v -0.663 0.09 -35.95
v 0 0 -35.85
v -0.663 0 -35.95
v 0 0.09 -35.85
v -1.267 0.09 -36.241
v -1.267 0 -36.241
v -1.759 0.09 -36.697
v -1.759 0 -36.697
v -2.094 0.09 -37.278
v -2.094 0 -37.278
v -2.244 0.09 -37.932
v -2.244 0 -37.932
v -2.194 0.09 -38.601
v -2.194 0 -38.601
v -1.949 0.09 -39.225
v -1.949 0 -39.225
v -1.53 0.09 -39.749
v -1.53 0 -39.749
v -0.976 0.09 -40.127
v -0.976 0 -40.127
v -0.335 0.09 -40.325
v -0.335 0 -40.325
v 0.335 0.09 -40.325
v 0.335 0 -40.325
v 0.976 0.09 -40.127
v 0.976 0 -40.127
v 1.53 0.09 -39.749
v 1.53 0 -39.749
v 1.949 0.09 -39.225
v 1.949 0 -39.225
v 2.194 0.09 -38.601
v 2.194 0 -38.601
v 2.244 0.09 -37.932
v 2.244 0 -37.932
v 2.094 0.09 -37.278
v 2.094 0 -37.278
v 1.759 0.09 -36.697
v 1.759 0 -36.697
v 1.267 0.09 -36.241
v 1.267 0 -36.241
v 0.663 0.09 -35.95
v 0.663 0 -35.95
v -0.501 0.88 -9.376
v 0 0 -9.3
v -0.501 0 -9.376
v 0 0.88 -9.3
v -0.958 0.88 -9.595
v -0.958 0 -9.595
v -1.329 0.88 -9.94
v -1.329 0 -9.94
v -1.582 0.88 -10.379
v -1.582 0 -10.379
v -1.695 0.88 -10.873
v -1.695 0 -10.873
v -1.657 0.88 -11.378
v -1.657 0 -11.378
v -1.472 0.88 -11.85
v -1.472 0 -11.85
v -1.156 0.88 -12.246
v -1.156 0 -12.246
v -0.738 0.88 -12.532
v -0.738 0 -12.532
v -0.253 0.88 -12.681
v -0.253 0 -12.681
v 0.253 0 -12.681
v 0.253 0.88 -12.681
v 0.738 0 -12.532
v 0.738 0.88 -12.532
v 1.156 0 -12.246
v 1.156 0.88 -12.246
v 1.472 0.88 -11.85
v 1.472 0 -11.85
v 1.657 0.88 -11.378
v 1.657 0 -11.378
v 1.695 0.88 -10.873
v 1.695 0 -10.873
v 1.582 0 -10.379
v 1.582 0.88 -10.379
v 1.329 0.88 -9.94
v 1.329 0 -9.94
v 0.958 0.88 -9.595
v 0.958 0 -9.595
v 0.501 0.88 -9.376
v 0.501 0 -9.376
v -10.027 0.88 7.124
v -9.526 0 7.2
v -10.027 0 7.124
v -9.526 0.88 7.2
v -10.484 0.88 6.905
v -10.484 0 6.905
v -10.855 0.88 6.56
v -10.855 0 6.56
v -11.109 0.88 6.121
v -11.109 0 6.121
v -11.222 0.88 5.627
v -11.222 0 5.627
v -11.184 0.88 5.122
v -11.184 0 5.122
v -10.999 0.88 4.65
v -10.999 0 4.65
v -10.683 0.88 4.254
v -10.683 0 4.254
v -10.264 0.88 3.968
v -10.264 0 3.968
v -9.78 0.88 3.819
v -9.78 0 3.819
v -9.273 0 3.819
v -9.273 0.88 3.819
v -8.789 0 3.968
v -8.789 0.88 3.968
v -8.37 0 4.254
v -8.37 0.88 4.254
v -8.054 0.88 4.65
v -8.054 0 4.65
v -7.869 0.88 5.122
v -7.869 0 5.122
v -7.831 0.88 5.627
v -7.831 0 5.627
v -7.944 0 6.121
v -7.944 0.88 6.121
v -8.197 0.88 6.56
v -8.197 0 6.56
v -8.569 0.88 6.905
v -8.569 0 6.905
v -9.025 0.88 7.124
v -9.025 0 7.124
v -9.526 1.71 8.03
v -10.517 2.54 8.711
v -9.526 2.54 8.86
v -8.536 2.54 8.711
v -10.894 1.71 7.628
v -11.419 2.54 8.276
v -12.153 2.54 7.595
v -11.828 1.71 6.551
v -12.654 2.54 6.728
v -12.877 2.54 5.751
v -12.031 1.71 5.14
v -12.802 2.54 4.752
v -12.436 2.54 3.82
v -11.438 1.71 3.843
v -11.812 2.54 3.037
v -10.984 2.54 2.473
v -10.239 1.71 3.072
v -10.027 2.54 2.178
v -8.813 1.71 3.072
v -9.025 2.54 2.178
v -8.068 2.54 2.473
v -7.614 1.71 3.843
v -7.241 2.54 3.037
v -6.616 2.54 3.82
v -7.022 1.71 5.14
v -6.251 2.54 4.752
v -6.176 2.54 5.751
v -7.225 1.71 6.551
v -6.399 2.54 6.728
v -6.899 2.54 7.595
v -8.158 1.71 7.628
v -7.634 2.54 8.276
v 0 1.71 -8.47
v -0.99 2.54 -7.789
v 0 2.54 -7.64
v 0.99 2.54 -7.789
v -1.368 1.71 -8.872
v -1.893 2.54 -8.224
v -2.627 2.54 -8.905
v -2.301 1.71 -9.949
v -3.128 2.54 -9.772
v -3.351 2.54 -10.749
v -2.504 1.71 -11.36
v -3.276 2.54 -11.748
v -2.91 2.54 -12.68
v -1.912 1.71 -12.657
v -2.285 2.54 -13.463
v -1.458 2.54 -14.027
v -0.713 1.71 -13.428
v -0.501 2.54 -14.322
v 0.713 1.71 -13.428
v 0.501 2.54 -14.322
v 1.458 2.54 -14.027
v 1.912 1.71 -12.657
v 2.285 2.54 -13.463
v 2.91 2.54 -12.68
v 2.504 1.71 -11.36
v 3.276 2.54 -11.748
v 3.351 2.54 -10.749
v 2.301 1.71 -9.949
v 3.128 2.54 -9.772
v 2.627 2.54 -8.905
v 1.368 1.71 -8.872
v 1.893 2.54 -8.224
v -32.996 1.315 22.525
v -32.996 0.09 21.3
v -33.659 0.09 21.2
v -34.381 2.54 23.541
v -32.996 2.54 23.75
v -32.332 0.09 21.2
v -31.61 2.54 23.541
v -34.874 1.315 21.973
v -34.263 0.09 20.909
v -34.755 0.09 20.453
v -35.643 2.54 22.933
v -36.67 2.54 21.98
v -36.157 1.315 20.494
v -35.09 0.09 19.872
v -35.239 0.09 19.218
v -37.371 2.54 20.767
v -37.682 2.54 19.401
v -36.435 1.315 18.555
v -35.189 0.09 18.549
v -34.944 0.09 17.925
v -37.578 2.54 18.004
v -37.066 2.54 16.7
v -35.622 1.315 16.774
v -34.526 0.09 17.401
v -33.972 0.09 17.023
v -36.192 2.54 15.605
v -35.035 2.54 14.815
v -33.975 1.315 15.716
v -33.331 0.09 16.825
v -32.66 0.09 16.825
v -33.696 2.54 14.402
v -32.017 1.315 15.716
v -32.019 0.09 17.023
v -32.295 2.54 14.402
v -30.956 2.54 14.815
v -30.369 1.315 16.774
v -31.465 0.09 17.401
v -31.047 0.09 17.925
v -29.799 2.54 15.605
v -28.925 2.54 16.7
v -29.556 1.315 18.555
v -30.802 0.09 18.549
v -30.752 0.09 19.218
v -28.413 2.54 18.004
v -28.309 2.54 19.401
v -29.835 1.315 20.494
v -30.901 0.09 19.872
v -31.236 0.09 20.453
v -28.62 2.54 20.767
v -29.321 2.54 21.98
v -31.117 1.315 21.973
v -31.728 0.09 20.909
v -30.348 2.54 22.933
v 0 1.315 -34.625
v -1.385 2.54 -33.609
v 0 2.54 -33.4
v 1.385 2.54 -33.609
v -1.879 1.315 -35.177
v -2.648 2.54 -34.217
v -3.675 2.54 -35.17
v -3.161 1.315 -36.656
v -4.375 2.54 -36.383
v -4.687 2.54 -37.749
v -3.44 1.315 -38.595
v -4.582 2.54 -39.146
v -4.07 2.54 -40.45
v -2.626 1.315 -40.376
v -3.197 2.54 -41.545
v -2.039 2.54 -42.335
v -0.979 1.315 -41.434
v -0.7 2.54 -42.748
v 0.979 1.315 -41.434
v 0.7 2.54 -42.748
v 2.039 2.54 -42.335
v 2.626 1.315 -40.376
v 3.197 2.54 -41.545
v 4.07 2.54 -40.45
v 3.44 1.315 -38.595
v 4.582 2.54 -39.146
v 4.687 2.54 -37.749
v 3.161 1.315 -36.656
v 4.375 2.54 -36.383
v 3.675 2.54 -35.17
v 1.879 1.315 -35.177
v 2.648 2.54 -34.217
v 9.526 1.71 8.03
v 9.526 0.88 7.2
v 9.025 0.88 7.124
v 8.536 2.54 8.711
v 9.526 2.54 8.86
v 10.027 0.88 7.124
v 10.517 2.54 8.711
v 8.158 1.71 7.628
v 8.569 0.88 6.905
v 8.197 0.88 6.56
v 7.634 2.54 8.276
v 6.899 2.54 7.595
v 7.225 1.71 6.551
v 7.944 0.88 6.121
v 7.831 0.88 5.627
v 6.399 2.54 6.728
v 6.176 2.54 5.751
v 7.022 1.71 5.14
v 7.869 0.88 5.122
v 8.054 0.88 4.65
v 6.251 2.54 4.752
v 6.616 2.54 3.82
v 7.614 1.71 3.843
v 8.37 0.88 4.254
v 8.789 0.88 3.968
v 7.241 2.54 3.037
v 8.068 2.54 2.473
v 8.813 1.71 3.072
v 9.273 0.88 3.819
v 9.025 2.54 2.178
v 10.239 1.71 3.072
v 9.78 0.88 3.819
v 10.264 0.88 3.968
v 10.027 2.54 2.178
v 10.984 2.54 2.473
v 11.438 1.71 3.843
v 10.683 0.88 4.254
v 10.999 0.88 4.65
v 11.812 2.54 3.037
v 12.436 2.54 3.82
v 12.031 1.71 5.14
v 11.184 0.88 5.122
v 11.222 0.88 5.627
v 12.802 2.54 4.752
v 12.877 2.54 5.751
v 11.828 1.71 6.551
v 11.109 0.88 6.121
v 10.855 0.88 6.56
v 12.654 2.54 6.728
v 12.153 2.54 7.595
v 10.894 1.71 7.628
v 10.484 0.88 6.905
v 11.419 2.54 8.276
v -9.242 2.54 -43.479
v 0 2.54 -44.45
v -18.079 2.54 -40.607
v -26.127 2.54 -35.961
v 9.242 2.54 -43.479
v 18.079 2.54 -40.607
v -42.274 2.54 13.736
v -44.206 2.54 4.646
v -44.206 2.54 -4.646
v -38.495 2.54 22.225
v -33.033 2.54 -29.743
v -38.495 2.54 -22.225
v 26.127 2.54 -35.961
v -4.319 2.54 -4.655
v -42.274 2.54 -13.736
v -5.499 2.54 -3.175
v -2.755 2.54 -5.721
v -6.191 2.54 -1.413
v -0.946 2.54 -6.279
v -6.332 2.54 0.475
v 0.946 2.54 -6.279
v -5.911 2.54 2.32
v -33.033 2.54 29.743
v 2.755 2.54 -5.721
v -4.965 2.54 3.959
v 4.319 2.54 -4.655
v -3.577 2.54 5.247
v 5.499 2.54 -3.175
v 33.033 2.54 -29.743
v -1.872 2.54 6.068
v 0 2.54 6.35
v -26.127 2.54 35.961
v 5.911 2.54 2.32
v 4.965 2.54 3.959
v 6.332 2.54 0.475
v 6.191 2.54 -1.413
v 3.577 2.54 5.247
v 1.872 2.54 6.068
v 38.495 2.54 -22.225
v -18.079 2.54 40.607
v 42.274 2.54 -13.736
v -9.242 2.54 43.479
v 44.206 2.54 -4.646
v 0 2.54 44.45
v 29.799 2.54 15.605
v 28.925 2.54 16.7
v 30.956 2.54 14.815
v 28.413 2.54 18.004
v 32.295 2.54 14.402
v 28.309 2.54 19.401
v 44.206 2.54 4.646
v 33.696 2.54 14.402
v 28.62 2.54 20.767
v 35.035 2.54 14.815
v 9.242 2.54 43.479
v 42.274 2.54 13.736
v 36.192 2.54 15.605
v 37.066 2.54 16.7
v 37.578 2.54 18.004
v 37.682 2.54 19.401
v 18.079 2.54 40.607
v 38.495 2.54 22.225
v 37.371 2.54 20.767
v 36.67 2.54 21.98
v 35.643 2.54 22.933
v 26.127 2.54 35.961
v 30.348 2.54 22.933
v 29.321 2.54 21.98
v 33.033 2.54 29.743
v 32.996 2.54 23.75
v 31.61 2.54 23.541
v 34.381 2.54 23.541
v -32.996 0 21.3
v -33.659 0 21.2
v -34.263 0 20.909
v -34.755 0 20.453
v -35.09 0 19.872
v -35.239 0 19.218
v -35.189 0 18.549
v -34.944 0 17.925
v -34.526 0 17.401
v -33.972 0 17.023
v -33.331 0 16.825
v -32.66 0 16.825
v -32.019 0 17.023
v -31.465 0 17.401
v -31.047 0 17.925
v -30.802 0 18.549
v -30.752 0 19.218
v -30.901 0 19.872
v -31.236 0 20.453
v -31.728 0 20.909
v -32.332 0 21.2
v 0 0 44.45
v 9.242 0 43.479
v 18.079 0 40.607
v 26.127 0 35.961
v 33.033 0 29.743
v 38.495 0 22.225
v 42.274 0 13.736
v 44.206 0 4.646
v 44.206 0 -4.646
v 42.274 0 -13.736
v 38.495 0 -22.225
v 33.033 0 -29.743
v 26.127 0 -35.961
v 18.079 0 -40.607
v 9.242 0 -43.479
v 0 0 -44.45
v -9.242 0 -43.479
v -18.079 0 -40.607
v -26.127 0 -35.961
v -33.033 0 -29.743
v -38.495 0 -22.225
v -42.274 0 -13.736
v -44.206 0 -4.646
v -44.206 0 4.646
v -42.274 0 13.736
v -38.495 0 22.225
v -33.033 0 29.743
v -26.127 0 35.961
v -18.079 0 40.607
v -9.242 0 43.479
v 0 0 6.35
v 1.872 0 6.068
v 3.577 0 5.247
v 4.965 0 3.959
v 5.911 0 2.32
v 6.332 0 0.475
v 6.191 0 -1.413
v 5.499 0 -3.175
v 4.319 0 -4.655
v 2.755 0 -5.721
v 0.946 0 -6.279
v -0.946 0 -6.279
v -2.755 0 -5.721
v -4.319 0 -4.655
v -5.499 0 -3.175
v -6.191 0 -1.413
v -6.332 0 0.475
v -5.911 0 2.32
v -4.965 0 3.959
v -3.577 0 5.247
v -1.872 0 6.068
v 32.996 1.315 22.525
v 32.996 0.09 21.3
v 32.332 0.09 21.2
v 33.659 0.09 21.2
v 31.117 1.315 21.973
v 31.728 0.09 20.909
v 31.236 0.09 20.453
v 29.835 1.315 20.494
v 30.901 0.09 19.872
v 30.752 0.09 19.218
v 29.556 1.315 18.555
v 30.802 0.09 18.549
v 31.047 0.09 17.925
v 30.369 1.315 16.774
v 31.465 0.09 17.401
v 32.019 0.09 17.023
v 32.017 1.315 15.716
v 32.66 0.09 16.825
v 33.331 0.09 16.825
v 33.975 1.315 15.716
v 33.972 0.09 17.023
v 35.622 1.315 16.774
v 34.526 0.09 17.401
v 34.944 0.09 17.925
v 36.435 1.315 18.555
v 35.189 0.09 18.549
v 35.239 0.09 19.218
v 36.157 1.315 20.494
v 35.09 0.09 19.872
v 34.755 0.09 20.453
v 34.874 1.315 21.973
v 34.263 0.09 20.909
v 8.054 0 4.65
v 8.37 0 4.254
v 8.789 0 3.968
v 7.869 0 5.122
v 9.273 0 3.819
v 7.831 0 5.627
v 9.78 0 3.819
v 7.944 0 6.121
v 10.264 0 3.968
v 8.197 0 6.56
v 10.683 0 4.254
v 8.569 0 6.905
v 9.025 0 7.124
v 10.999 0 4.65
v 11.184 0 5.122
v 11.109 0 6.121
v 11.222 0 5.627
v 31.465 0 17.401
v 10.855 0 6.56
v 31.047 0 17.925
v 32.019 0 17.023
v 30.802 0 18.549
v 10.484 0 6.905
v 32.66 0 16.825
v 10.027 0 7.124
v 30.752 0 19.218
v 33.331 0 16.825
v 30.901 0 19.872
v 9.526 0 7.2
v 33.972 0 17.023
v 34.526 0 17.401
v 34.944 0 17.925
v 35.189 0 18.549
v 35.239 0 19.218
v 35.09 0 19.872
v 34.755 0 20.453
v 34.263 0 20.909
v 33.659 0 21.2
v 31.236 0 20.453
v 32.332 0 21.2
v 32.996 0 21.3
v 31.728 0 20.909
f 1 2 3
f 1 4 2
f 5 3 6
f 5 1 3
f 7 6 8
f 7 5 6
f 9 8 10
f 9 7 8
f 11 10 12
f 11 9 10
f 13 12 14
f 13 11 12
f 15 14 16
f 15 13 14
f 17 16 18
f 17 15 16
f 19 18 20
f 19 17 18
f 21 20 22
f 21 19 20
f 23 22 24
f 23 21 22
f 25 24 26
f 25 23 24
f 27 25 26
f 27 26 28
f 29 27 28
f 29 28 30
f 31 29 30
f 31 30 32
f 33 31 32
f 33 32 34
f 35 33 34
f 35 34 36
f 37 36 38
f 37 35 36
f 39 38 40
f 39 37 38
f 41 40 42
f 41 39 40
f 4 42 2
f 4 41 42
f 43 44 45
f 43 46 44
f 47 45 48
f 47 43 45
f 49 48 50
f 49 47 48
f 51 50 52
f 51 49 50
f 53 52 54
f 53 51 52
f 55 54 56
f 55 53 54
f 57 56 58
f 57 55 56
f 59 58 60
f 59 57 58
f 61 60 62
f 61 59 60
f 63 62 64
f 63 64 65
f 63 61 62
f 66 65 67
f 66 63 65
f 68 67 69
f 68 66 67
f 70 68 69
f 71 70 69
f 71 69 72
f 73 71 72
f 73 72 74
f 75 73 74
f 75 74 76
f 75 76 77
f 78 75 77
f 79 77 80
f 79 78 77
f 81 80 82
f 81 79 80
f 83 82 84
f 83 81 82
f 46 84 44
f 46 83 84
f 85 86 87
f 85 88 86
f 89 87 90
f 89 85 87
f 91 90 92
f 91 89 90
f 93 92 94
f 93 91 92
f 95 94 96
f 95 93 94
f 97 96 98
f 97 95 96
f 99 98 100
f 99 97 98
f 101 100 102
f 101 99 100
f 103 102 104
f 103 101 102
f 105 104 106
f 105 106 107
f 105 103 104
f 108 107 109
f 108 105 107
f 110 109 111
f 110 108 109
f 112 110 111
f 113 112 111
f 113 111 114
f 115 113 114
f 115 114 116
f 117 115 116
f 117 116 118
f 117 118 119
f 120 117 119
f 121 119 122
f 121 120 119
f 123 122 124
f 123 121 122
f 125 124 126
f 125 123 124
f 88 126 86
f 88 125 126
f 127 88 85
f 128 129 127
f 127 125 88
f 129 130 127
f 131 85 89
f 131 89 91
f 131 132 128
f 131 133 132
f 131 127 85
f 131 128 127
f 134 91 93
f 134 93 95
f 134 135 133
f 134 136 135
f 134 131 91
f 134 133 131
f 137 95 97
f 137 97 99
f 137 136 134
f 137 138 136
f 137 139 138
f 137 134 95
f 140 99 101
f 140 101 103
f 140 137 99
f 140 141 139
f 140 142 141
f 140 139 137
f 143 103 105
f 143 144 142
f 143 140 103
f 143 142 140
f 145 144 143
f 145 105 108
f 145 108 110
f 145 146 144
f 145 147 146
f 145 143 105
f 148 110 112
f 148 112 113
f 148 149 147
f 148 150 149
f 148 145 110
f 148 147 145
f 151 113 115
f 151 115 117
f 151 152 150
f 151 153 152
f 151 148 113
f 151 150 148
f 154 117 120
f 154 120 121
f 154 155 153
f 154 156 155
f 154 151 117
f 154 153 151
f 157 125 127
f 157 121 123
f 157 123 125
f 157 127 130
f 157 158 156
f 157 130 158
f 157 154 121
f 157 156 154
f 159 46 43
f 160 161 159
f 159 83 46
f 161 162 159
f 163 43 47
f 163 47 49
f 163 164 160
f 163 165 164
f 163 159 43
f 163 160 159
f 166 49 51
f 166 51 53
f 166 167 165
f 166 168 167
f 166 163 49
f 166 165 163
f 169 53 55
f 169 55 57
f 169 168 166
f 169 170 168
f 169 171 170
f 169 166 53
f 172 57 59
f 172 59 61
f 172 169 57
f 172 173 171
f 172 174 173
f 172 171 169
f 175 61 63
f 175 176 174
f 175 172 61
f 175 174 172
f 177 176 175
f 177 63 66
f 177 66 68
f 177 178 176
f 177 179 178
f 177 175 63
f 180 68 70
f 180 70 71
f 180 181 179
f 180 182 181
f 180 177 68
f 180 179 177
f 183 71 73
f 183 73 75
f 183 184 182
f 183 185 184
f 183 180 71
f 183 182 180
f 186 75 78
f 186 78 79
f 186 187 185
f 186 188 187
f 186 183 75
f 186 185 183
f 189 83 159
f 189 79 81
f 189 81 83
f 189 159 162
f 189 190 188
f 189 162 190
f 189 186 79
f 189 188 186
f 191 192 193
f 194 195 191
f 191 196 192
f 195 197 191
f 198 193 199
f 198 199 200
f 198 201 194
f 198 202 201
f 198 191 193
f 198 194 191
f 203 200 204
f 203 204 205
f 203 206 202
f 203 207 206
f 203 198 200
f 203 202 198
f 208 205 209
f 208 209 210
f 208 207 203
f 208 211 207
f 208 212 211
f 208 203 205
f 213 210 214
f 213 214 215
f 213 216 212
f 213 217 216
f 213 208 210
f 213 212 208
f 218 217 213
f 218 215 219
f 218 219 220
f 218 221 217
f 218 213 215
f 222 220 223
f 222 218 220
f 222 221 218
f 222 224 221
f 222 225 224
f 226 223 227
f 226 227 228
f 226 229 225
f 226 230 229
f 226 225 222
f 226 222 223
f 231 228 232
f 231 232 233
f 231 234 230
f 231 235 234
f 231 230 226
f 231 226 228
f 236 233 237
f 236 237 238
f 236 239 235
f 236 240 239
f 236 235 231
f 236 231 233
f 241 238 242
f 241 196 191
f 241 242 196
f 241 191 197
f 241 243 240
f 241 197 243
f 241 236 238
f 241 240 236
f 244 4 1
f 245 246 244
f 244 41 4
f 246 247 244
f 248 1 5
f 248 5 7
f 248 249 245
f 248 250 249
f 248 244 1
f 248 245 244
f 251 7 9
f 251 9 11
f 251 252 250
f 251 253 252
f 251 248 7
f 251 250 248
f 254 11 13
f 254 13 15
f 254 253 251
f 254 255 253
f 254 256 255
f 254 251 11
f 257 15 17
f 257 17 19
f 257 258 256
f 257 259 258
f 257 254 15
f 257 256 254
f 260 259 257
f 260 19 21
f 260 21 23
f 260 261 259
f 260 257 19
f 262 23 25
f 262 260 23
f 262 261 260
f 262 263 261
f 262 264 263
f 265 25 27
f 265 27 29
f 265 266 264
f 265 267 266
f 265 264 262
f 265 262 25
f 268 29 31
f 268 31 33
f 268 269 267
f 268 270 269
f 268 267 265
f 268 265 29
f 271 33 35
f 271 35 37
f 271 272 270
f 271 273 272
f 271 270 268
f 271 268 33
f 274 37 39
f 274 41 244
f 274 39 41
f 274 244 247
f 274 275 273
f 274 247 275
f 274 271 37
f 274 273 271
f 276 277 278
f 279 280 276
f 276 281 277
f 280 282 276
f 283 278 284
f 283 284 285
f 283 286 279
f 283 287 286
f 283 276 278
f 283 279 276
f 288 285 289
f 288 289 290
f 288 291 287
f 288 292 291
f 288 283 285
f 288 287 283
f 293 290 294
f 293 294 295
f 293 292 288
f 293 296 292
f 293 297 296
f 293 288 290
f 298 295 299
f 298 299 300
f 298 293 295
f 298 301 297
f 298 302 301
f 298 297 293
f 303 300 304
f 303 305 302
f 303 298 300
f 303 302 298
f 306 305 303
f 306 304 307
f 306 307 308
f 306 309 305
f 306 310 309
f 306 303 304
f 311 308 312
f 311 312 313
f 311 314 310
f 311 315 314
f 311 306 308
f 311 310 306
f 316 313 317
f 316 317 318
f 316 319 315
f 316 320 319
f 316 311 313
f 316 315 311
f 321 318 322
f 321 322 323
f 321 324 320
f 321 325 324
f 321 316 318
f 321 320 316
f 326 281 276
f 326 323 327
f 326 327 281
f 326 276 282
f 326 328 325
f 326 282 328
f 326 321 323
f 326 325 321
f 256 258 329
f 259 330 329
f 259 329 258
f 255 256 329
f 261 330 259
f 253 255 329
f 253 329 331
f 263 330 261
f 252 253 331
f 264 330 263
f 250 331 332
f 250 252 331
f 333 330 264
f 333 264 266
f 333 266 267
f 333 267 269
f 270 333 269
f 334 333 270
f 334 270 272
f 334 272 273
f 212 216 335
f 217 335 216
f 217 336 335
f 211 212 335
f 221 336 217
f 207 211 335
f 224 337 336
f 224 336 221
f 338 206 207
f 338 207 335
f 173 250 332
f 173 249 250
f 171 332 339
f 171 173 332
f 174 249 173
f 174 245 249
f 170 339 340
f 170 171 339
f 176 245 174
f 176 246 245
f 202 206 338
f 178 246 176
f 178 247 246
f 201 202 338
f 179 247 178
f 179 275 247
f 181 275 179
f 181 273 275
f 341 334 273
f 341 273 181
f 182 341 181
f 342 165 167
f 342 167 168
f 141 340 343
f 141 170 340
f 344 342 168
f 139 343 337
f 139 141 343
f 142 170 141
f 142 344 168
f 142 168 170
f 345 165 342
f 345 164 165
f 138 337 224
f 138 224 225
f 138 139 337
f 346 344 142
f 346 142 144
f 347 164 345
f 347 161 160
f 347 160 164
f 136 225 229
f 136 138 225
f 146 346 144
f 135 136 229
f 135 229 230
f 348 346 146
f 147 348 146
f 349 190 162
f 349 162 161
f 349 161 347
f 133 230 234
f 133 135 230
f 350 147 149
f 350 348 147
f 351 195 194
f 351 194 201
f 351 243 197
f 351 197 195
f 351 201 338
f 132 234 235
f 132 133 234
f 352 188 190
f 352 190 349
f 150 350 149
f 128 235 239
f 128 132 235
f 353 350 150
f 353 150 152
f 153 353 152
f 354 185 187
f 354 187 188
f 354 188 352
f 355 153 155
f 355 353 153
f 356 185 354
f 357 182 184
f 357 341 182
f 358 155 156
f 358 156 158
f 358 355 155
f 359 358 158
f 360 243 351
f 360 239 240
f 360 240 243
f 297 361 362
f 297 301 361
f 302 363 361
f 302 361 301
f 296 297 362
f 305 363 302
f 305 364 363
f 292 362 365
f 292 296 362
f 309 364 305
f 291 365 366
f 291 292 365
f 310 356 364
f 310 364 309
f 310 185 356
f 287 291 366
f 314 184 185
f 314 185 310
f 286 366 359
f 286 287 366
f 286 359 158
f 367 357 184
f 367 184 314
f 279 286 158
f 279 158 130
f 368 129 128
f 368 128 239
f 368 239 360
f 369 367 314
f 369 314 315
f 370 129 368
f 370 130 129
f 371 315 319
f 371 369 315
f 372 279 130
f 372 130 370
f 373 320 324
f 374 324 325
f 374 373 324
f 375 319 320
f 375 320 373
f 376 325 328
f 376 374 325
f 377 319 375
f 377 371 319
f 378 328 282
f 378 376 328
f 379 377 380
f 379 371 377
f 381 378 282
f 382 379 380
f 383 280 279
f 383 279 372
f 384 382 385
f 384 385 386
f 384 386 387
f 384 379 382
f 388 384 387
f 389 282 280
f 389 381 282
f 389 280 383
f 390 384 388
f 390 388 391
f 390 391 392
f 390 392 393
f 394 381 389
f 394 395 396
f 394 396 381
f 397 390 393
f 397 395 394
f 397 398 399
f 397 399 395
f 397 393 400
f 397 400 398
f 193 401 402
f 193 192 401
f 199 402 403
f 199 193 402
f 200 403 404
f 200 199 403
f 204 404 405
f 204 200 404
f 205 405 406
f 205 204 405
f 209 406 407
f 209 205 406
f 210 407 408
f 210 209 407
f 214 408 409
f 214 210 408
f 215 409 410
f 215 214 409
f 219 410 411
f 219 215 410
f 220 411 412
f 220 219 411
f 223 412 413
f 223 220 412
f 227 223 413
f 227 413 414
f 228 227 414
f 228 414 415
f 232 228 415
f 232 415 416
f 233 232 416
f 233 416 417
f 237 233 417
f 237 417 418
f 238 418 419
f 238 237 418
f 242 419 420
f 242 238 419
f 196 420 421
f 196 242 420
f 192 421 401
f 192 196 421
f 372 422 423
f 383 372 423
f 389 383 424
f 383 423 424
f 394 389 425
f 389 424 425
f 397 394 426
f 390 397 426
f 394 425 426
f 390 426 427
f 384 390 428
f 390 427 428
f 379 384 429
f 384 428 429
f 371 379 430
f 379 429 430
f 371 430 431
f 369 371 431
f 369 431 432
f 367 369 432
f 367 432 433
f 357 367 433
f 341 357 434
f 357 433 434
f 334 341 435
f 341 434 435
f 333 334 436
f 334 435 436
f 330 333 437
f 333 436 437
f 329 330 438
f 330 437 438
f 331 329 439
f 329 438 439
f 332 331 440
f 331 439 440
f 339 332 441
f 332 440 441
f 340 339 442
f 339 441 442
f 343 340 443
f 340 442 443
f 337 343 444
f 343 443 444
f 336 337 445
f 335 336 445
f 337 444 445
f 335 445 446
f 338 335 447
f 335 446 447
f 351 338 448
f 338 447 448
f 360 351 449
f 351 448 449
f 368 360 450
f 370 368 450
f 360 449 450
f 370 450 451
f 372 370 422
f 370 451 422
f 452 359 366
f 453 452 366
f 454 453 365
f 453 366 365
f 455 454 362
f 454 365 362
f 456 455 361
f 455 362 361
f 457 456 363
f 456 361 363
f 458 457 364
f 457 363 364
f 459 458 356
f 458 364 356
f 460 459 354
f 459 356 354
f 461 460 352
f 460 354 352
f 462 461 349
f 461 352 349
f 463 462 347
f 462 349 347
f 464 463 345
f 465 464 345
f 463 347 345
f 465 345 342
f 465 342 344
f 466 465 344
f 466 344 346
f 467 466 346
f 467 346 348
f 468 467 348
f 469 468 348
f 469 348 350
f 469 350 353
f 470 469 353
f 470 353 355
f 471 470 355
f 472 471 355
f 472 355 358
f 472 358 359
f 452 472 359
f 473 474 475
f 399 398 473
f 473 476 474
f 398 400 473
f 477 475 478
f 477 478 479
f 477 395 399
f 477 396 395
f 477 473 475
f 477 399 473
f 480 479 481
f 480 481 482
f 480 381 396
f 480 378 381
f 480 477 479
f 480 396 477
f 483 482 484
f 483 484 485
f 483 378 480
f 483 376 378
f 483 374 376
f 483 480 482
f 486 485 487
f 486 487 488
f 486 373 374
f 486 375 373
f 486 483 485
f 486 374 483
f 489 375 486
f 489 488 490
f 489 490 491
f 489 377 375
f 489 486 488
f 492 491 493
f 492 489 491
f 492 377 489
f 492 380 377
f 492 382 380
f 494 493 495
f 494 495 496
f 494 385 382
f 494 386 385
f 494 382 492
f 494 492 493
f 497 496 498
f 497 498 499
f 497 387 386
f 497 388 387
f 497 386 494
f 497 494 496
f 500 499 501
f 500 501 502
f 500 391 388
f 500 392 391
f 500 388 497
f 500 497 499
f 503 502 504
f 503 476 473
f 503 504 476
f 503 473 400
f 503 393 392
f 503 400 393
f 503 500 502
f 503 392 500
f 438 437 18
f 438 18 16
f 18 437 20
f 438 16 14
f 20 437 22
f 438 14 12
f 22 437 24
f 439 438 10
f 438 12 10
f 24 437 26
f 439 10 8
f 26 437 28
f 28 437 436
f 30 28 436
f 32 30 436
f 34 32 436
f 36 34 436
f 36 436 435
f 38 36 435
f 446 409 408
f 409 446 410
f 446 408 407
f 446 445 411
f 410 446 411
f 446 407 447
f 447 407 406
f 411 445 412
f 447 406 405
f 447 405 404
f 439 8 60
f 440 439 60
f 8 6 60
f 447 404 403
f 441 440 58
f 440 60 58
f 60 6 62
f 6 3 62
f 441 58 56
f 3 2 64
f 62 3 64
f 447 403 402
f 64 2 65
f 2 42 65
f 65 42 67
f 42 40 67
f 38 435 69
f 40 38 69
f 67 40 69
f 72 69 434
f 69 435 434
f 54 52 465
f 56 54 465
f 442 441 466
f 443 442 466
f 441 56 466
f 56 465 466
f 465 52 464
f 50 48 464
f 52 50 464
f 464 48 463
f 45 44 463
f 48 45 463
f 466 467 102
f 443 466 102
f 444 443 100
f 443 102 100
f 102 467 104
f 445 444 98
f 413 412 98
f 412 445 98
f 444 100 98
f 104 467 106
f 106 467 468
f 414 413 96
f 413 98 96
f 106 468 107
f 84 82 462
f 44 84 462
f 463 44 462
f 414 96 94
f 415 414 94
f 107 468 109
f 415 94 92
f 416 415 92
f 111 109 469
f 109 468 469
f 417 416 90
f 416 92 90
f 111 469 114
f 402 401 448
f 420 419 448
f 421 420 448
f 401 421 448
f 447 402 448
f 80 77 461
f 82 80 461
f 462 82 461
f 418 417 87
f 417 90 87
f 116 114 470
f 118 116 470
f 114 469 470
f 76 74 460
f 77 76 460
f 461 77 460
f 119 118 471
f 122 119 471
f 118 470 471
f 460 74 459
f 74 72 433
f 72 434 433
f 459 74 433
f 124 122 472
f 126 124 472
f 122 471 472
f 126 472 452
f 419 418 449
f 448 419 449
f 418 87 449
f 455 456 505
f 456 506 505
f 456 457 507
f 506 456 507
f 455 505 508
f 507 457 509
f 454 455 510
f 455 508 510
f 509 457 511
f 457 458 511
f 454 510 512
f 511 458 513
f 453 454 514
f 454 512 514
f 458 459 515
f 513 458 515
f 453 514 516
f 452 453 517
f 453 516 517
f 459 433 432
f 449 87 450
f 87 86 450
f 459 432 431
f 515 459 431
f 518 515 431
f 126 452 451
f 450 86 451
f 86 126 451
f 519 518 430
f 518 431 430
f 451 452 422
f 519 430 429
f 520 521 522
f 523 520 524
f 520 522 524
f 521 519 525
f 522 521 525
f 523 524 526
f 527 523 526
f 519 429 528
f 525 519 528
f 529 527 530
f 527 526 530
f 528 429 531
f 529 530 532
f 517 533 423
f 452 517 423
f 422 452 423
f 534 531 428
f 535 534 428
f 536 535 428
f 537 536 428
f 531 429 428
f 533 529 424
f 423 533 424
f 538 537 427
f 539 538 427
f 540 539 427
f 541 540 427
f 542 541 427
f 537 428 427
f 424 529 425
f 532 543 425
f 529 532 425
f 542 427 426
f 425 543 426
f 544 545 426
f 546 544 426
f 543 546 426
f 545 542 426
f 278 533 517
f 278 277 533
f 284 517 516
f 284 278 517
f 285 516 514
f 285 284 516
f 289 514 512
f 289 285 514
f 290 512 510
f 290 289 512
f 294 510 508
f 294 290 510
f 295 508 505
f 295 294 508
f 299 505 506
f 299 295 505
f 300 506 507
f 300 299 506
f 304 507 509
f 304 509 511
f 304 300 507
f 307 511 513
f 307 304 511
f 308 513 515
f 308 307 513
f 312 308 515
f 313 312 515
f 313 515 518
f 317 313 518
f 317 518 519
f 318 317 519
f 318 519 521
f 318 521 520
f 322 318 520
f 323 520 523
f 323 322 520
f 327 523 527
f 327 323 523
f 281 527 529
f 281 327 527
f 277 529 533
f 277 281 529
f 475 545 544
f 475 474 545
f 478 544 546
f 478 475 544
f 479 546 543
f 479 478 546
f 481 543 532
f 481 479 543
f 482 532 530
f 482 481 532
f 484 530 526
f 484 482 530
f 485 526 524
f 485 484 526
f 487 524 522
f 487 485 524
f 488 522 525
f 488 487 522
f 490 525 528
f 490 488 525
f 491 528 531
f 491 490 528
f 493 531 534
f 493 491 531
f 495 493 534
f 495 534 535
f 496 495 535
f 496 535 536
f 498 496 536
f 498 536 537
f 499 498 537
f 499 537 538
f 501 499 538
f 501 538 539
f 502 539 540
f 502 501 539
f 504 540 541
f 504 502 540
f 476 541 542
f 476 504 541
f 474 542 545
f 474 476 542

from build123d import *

# Parameters (mm, degrees)
SKETCH1_R                                      = 44.45
BOSS_EXTRUDE1_DEPTH                            = 2.54
CSK_FOR_M4_FLAT_HEAD_MACHINE_SCREW1_AT_2_COUNT = 2
CSK_FOR_M4_FLAT_HEAD_MACHINE_SCREW1_AT_2_PITCH = 65.991135768
CSK_FOR_M4_FLAT_HEAD_MACHINE_SCREW1_AT_3_COUNT = 2
CSK_FOR_M4_FLAT_HEAD_MACHINE_SCREW1_AT_3_PITCH = 65.991135768
SKETCH11_R                                     = 6.35
CUT_EXTRUDE1_DEPTH                             = 63.913087669
CSK_FOR_M3_SFHCS1_AT_2_COUNT                   = 2
CSK_FOR_M3_SFHCS1_AT_2_PITCH                   = 19.052558883
CSK_FOR_M3_SFHCS1_AT_3_COUNT                   = 2
CSK_FOR_M3_SFHCS1_AT_3_PITCH                   = 19.052558883


with BuildPart() as part:
    # Sketch1 → Boss-Extrude1 (new body)
    with BuildSketch(Plane(origin=(0, 0, 0), x_dir=(1, 0, 0), z_dir=(0, 1, 0))):
        with Locations(Location((0, 0, 0), (0, 0, 270))):
            Circle(SKETCH1_R)
    extrude(amount=BOSS_EXTRUDE1_DEPTH)

    # Sketch8 → CSK for M4 Flat Head Machine Screw1 (revolve, cut)
    with BuildSketch(Plane(origin=(0, 2.54, -38.1), x_dir=(0, 0, 1), z_dir=(1, 0, 0))):
        Polygon((0, 0), (0, 2.54), (2.25, 2.54), (2.25, 2.45), (4.7, 0), align=None)
    csk_for_m4_flat_head_machine_screw1 = revolve(axis=Axis((0, 8.89, -38.1), (0, -1, 0)), mode=Mode.SUBTRACT)

    # CSK for M4 Flat Head Machine Screw1 at 2: CSK for M4 Flat Head Machine Screw1 ×2
    with Locations(*[Vector(-0.5000000000000039, 0, 0.8660254037844365) * (i * CSK_FOR_M4_FLAT_HEAD_MACHINE_SCREW1_AT_2_PITCH) for i in range(1, CSK_FOR_M4_FLAT_HEAD_MACHINE_SCREW1_AT_2_COUNT)]):
        add(csk_for_m4_flat_head_machine_screw1, mode=Mode.SUBTRACT)

    # CSK for M4 Flat Head Machine Screw1 at 3: CSK for M4 Flat Head Machine Screw1 ×2
    with Locations(*[Vector(0.4999999999999982, 0, 0.8660254037844397) * (i * CSK_FOR_M4_FLAT_HEAD_MACHINE_SCREW1_AT_3_PITCH) for i in range(1, CSK_FOR_M4_FLAT_HEAD_MACHINE_SCREW1_AT_3_COUNT)]):
        add(csk_for_m4_flat_head_machine_screw1, mode=Mode.SUBTRACT)

    # Sketch11 → Cut-Extrude1 (cut, through all)
    with BuildSketch(Plane(origin=(0, 2.54, 0), x_dir=(1, 0, 0), z_dir=(0, 1, 0))):
        with Locations(Location((0, 0, 0), (0, 0, 270))):
            Circle(SKETCH11_R)
    extrude(amount=-CUT_EXTRUDE1_DEPTH, mode=Mode.SUBTRACT)

    # Sketch13 → CSK for M3 SFHCS1 (revolve, cut)
    with BuildSketch(Plane(origin=(0, 2.54, -11), x_dir=(0, 0, 1), z_dir=(1, 0, 0))):
        Polygon((0, 0), (0, 2.54), (1.7, 2.54), (1.7, 1.66), (3.36, 0), align=None)
    csk_for_m3_sfhcs1 = revolve(axis=Axis((0, 8.89, -11), (0, -1, 0)), mode=Mode.SUBTRACT)

    # CSK for M3 SFHCS1 at 2: CSK for M3 SFHCS1 ×2
    with Locations(*[Vector(-0.5, 0, 0.8660254037844387) * (i * CSK_FOR_M3_SFHCS1_AT_2_PITCH) for i in range(1, CSK_FOR_M3_SFHCS1_AT_2_COUNT)]):
        add(csk_for_m3_sfhcs1, mode=Mode.SUBTRACT)

    # CSK for M3 SFHCS1 at 3: CSK for M3 SFHCS1 ×2
    with Locations(*[Vector(0.5, 0, 0.8660254037844387) * (i * CSK_FOR_M3_SFHCS1_AT_3_PITCH) for i in range(1, CSK_FOR_M3_SFHCS1_AT_3_COUNT)]):
        add(csk_for_m3_sfhcs1, mode=Mode.SUBTRACT)


solid = part.part
